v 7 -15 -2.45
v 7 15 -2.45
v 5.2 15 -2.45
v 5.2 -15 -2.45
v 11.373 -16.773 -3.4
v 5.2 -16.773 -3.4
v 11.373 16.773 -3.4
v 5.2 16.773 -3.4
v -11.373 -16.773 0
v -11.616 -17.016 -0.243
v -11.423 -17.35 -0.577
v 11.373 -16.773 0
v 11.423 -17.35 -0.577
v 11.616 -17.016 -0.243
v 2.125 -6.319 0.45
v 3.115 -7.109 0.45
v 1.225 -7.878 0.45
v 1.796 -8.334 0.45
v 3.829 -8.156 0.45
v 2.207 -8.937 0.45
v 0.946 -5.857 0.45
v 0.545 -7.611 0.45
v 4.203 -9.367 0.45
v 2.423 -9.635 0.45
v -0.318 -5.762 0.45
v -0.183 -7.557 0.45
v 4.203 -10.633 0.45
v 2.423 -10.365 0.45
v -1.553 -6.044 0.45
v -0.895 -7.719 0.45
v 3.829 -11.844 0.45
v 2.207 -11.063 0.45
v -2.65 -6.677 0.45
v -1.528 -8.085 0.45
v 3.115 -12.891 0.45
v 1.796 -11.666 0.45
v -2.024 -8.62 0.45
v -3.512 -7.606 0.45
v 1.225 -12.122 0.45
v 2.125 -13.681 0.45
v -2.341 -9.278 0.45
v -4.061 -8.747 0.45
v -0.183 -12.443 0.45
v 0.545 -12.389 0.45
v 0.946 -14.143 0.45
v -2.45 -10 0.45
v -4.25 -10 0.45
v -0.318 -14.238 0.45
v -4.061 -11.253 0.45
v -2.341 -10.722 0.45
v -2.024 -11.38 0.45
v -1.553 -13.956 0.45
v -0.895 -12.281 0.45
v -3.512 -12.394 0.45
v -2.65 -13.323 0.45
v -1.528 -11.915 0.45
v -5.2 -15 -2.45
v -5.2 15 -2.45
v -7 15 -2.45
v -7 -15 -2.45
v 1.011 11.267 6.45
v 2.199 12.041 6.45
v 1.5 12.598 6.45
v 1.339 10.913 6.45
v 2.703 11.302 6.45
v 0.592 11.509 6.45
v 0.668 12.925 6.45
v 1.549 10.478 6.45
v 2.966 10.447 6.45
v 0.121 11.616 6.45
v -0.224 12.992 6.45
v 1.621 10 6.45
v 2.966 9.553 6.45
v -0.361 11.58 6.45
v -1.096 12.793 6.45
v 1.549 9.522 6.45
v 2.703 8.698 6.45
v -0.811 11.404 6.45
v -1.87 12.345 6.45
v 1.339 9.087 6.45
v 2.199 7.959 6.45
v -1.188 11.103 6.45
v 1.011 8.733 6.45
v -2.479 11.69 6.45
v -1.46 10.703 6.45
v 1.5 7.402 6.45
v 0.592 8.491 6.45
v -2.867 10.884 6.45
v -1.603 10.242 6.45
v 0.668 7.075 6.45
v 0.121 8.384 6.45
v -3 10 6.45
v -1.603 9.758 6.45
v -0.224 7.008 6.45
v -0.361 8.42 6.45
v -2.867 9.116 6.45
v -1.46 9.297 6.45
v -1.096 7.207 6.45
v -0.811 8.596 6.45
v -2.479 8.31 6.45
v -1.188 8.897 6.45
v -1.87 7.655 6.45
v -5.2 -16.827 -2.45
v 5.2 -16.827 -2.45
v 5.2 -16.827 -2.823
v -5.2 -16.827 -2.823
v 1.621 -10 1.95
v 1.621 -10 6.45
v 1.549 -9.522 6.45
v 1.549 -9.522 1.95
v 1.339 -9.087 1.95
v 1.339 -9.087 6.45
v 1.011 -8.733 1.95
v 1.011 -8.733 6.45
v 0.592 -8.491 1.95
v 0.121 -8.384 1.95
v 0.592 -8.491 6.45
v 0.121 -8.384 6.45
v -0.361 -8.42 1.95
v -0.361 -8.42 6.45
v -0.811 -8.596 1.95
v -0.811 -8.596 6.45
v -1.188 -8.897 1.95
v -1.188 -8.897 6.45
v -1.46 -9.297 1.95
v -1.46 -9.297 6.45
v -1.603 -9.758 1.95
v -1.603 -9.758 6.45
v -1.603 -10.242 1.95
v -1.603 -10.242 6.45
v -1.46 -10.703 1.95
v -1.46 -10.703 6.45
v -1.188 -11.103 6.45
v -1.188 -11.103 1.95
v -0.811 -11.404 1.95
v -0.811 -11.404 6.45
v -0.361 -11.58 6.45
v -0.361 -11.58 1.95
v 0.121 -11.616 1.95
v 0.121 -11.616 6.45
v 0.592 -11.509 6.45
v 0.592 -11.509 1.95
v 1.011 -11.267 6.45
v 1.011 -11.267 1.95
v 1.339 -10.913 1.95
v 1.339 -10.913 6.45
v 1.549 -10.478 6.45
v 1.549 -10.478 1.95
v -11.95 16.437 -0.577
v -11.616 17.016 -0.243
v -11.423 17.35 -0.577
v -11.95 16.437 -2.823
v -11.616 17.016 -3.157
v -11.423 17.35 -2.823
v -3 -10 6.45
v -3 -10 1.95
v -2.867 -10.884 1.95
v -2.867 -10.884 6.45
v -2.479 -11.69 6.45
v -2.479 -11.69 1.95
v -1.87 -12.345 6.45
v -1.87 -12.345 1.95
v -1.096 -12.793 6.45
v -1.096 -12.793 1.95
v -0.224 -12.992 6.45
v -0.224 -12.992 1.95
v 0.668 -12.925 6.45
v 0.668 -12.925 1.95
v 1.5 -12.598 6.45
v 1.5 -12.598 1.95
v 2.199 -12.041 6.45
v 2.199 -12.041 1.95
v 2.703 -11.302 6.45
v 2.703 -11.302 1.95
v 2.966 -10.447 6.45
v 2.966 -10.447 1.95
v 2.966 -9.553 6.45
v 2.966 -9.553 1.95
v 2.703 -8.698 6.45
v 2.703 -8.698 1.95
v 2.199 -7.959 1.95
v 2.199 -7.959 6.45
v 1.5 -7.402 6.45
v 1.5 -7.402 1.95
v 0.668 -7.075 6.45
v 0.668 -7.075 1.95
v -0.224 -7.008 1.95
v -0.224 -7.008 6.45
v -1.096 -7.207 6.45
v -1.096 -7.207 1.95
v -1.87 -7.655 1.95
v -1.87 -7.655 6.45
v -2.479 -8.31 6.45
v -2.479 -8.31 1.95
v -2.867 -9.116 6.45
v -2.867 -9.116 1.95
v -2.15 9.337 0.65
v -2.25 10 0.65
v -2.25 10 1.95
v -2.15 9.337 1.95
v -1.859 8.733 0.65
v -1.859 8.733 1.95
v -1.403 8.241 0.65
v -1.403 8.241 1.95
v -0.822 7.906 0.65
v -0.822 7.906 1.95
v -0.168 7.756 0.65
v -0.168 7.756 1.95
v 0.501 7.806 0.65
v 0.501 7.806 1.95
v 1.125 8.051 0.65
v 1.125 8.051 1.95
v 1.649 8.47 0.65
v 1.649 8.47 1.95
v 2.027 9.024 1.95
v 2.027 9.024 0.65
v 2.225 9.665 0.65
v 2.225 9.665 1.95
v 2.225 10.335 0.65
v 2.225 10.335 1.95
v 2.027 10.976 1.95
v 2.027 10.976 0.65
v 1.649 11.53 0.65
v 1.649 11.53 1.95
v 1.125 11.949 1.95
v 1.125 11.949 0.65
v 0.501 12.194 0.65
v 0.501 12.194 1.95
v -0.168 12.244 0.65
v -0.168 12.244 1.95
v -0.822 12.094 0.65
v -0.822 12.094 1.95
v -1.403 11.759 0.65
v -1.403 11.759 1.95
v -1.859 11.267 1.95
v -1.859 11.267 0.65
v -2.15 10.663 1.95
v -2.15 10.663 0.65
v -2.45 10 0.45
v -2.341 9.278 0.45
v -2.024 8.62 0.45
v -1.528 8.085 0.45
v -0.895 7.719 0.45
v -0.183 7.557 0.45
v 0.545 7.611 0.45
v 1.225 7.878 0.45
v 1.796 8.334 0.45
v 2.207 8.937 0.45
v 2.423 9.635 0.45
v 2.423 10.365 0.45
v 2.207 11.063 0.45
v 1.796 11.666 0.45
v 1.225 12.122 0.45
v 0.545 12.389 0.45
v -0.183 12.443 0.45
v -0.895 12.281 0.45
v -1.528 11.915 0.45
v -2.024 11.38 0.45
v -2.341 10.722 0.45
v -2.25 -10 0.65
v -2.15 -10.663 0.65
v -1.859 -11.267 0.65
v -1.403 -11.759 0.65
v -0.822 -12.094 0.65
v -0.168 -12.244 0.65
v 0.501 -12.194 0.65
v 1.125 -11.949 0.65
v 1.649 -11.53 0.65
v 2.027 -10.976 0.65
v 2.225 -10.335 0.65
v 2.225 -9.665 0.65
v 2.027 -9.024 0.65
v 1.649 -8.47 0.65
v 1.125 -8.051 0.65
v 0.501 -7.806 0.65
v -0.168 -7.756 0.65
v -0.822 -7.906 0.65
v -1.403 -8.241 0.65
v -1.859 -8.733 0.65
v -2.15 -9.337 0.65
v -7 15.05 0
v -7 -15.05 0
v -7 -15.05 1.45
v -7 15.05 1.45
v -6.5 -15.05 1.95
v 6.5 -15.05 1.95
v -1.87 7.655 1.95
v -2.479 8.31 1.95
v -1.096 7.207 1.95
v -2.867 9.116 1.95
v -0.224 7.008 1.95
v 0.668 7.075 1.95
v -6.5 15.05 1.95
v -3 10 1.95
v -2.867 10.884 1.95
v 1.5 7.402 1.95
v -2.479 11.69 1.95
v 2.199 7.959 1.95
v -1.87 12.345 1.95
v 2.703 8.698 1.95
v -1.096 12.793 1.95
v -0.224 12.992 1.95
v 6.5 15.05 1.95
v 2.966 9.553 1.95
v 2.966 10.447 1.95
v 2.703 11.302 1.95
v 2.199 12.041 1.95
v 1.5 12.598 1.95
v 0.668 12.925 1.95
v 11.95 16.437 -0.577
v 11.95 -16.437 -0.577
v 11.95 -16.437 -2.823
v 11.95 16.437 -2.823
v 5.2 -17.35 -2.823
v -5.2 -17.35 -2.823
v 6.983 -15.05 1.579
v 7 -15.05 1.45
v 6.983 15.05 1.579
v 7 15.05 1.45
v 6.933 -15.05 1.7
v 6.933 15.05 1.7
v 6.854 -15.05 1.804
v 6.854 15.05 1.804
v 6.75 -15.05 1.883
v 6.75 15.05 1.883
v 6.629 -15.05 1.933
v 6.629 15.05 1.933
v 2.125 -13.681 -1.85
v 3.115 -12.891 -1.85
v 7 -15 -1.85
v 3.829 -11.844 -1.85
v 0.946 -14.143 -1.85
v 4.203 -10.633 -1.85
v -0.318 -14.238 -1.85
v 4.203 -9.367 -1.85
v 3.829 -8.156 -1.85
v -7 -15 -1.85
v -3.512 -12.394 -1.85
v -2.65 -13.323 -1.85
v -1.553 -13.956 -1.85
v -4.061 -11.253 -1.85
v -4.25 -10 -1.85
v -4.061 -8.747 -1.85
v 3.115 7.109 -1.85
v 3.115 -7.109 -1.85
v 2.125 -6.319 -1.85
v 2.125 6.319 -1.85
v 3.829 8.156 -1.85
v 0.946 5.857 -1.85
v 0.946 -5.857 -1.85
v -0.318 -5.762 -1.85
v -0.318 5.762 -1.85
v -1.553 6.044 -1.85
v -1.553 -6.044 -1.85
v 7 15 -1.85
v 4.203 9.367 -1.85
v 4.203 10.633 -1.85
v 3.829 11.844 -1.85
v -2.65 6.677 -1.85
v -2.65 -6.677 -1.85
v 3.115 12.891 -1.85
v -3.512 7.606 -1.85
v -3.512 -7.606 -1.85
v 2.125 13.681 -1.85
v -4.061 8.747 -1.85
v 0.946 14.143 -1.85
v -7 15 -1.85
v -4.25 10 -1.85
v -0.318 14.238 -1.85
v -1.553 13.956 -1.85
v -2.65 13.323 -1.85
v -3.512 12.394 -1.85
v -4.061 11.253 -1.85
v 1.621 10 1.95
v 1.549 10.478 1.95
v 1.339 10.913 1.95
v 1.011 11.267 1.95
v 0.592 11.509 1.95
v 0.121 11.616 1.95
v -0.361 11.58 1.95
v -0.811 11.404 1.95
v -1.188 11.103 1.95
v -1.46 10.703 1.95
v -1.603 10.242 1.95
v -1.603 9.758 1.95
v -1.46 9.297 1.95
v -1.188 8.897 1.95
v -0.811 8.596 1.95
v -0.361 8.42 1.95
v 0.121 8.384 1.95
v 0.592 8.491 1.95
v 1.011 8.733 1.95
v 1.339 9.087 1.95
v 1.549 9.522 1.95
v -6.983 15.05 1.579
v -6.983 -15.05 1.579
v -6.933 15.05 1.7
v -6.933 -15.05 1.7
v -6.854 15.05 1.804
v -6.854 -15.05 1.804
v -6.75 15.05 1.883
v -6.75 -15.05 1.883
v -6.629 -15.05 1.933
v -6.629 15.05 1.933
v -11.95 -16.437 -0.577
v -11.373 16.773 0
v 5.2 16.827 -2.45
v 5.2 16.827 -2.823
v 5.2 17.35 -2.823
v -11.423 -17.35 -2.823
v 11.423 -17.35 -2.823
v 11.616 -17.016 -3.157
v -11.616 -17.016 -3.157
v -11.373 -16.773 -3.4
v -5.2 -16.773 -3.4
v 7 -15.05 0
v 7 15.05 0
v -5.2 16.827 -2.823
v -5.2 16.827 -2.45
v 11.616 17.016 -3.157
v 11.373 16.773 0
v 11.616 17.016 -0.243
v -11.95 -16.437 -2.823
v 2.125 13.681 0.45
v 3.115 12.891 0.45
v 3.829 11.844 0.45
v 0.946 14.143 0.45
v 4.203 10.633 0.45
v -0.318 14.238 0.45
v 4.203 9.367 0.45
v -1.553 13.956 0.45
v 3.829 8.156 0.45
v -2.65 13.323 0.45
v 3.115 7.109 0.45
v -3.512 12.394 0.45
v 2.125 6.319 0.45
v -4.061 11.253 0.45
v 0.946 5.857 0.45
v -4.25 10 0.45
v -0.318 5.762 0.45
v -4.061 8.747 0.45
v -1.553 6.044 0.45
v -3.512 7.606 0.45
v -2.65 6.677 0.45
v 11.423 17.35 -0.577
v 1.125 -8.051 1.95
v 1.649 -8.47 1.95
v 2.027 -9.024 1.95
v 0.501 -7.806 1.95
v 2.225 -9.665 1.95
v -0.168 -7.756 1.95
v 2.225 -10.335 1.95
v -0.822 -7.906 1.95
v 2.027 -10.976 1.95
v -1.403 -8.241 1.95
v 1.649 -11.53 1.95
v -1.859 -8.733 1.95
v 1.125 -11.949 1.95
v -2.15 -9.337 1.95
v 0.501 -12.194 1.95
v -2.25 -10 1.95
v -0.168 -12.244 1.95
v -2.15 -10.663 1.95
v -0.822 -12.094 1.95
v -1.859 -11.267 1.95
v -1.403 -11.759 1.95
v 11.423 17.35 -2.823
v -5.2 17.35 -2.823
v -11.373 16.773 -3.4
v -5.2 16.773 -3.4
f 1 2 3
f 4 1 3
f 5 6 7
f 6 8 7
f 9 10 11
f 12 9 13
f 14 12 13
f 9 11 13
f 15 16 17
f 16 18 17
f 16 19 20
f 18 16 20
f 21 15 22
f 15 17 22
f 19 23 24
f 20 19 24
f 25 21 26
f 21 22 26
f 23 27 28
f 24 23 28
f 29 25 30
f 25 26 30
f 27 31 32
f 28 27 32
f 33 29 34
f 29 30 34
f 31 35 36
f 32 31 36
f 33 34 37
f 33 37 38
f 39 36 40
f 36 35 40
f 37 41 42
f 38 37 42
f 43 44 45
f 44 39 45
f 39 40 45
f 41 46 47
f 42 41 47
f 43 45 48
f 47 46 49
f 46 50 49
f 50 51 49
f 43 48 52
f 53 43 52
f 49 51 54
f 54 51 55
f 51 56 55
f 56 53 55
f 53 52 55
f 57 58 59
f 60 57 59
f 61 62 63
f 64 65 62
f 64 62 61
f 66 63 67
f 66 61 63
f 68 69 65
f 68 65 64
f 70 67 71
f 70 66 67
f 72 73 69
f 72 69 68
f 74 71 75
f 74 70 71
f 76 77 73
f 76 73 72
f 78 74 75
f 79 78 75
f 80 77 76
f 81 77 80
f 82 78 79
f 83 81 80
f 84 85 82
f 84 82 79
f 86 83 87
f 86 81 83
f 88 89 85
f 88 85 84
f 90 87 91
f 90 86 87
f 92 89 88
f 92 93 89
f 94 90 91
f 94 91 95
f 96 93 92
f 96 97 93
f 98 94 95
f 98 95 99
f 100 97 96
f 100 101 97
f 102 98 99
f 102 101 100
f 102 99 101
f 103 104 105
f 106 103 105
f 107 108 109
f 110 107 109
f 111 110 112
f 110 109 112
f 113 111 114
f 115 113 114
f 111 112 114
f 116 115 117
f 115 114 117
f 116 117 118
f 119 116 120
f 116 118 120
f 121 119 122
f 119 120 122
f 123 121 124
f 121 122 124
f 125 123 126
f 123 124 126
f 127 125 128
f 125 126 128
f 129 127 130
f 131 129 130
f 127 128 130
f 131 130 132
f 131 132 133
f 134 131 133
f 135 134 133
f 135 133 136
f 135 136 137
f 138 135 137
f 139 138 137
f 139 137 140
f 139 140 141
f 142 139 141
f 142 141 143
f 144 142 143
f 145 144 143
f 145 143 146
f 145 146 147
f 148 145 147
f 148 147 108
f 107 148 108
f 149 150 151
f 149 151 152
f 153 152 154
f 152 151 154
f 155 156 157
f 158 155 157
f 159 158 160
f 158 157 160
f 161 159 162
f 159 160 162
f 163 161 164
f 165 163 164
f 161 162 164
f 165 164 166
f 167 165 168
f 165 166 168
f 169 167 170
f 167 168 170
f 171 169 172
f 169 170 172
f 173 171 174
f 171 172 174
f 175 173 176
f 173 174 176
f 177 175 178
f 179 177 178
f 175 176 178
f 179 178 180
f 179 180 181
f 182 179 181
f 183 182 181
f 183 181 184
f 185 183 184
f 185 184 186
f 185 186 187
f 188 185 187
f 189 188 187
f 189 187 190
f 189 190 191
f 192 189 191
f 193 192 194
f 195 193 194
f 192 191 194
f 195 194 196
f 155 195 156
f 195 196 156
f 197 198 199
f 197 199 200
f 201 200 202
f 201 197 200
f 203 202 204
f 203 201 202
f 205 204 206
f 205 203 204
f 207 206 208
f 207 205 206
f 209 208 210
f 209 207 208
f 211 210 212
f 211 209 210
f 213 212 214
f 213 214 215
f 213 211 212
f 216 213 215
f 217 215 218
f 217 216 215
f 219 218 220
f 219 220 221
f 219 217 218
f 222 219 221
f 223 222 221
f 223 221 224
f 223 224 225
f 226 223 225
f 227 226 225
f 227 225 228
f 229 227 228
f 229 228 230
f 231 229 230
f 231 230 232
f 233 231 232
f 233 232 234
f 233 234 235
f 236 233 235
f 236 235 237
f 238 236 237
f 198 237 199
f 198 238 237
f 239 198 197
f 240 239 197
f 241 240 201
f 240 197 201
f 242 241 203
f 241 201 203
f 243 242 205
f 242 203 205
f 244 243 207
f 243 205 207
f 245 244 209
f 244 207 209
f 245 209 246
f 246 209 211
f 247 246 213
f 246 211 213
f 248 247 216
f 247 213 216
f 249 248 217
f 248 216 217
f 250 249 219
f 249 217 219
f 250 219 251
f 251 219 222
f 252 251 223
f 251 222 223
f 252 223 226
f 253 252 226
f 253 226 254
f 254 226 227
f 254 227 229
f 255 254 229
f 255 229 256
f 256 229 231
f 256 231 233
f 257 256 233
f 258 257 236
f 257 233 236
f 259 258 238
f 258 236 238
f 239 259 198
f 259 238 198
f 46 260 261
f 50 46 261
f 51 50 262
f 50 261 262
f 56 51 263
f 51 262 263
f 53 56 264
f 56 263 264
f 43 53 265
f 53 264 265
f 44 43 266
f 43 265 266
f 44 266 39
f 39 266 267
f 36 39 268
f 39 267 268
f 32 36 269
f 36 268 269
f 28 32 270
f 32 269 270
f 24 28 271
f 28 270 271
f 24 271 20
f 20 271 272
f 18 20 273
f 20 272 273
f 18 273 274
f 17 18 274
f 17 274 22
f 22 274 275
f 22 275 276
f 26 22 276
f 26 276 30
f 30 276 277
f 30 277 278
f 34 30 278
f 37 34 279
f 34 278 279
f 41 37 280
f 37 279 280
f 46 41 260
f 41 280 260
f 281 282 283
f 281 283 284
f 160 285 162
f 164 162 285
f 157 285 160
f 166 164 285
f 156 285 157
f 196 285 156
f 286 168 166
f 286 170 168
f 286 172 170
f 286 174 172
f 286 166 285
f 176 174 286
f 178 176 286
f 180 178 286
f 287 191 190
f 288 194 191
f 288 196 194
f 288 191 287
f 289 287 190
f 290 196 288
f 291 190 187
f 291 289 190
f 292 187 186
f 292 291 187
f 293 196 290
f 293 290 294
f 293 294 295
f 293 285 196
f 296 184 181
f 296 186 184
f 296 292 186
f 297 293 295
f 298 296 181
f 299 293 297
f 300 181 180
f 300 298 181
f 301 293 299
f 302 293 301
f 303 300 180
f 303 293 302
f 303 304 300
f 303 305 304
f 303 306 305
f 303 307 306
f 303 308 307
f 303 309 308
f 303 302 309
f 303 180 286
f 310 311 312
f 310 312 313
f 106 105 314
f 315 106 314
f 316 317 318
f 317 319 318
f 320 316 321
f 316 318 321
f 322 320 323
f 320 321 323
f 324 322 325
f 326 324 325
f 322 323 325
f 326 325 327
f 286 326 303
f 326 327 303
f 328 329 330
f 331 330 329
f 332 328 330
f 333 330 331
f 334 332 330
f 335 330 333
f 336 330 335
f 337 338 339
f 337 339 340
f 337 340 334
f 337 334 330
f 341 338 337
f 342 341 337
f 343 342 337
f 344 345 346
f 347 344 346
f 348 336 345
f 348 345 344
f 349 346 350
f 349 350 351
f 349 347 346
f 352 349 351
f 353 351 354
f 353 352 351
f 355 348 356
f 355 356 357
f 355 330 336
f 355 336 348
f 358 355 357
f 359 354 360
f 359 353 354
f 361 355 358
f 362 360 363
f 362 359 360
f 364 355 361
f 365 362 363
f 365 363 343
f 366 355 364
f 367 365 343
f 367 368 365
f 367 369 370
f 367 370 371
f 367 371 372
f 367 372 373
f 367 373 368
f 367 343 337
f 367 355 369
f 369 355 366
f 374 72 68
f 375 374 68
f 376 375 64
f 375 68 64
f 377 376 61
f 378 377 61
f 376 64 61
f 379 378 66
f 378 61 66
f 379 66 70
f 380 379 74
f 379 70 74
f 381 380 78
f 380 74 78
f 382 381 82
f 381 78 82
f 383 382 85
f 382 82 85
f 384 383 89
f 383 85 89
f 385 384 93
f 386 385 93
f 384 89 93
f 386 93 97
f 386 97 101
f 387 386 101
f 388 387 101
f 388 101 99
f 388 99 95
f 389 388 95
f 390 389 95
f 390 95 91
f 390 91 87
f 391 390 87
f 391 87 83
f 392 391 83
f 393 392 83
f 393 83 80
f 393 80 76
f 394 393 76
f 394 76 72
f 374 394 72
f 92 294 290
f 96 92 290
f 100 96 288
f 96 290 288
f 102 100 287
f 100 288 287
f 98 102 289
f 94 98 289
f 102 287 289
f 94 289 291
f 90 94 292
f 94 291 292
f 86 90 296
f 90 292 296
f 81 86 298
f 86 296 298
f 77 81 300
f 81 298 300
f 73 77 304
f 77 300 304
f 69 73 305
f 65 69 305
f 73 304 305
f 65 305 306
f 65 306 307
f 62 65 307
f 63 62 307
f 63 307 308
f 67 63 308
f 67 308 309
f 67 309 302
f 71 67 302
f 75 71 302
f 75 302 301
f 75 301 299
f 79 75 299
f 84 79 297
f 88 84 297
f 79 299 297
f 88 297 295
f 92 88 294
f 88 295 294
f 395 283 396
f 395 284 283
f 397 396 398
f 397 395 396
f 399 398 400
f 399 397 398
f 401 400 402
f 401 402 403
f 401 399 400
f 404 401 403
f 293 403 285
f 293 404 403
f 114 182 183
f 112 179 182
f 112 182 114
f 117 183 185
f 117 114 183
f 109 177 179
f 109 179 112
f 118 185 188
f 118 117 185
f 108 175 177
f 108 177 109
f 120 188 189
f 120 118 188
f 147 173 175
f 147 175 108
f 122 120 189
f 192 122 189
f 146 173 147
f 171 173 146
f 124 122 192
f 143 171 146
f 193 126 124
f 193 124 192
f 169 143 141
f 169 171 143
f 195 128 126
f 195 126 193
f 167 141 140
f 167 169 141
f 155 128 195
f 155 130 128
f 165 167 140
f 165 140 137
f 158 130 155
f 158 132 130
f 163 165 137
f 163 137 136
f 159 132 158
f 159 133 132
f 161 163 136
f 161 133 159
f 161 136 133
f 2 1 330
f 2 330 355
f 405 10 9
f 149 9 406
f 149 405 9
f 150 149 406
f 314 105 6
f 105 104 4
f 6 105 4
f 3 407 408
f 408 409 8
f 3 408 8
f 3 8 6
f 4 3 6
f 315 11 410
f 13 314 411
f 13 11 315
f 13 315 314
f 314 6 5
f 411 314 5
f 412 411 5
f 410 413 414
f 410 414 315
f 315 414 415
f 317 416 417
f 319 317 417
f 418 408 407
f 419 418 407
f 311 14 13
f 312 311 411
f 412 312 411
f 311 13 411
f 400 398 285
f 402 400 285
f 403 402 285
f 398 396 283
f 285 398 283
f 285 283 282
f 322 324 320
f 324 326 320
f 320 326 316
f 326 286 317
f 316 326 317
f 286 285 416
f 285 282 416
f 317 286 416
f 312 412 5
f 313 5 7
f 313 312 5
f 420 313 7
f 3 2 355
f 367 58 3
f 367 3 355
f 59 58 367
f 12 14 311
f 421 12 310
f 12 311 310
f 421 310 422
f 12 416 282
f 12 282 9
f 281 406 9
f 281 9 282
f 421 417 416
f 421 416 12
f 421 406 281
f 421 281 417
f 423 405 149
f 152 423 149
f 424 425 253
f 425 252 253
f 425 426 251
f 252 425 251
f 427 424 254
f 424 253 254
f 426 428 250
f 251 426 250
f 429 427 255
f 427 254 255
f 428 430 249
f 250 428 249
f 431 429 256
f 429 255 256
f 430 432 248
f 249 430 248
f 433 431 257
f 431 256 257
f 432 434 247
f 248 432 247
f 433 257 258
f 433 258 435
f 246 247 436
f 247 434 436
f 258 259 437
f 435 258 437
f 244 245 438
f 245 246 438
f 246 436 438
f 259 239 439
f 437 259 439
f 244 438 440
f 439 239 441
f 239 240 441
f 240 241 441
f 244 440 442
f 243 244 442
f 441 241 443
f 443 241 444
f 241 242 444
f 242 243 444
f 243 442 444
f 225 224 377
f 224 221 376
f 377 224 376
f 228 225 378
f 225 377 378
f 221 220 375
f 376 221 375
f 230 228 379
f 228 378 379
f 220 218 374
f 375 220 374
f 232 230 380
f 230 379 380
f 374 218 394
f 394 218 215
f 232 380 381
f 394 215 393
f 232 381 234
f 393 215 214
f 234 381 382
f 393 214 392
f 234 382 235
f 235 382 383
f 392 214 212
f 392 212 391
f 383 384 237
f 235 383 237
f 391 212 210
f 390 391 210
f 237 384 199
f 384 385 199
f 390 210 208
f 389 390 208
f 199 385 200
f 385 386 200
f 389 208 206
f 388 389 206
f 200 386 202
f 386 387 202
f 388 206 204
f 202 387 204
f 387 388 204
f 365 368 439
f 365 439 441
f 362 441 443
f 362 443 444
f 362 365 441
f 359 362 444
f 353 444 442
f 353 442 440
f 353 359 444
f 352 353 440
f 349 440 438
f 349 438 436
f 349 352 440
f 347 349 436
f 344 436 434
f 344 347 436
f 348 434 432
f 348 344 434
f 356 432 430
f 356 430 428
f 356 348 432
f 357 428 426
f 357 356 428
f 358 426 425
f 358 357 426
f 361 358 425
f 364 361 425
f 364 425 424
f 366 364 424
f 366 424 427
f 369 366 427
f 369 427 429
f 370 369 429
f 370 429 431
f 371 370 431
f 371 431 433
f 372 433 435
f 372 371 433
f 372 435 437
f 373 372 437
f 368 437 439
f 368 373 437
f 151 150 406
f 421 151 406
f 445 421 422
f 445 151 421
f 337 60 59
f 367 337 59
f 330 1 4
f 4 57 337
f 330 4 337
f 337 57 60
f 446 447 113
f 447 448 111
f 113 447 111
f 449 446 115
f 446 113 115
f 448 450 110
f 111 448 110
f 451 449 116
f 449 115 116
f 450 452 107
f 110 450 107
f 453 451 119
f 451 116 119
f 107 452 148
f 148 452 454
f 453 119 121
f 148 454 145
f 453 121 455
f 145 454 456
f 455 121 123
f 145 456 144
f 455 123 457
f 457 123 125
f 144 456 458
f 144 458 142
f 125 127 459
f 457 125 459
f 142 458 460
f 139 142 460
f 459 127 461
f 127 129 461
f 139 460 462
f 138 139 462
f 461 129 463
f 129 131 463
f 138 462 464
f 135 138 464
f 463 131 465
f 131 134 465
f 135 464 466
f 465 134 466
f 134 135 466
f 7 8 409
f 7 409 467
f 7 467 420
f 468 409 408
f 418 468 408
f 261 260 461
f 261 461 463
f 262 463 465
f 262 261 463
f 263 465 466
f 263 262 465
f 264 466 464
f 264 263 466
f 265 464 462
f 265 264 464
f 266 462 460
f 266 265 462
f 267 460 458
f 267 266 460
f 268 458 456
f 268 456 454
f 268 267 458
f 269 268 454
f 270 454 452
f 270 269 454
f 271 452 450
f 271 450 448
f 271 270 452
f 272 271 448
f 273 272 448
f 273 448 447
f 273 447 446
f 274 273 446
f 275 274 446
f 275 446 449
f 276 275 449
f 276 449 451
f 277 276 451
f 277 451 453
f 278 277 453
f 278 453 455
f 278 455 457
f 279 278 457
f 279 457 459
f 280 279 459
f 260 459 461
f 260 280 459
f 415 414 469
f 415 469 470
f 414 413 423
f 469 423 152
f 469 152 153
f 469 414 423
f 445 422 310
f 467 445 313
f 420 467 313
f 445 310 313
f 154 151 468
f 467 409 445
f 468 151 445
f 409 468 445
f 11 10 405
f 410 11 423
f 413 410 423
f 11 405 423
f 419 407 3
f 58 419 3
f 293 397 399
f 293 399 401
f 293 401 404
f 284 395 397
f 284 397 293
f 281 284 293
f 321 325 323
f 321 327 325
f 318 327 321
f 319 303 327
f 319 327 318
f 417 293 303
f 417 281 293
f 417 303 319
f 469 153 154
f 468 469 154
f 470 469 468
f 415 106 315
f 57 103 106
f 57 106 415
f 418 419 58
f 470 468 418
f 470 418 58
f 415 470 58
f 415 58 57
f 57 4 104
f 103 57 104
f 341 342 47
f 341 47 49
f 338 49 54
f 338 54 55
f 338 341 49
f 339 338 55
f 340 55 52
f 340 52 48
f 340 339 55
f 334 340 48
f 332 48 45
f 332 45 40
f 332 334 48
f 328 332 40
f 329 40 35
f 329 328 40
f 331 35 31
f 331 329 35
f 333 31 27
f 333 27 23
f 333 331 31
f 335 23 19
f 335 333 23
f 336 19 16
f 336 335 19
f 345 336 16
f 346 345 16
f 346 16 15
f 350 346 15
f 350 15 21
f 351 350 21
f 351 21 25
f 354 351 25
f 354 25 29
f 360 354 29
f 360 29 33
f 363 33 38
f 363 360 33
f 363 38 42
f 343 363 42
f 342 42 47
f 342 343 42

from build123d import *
from OCP.BRepFilletAPI import BRepFilletAPI_MakeChamfer

# Parameters (mm, degrees)
SKETCH1_W           = 23.9
SKETCH1_H           = 34.7
BOSS_EXTRUDE1_DEPTH = 3.4
SKETCH2_W           = 14
SKETCH2_H           = 30.1
BOSS_EXTRUDE2_DEPTH = 1.95
SKETCH3_R           = 3
BOSS_EXTRUDE3_DEPTH = 4.5
CHAMFER1_SIZE       = 0.577
CUT_EXTRUDE1_DEPTH  = 5.2
SKETCH6_W           = 14
SKETCH6_H           = 30
CUT_EXTRUDE2_DEPTH  = 0.6
SKETCH7_R           = 4.25
CUT_EXTRUDE3_DEPTH  = 2.3
SKETCH8_R           = 2.25
CUT_EXTRUDE4_DEPTH  = 1.5
FILLET1_R           = 0.5
CHAMFER2_SIZE       = 0.577
CHAMFER3_SIZE       = 0.527
CHAMFER3_SIZE2      = 0.913344887
CHAMFER4_SIZE       = 0.913344887
CHAMFER4_SIZE2      = 0.527
CUT_EXTRUDE5_REACH  = 25.256
SKETCH9_R           = 1.621
CHAMFER5_SIZE       = 0.2


with BuildPart() as part:
    # Sketch1 → Boss-Extrude1 (new body)
    with BuildSketch(Plane.XY):
        Rectangle(SKETCH1_W, SKETCH1_H)
    extrude(amount=-BOSS_EXTRUDE1_DEPTH)

    # Sketch2 → Boss-Extrude2 (add)
    with BuildSketch(Plane.XY):
        Rectangle(SKETCH2_W, SKETCH2_H)
    extrude(amount=BOSS_EXTRUDE2_DEPTH)

    # Sketch3 → Boss-Extrude3 (add)
    with BuildSketch(Plane.XY.offset(1.95)):
        with Locations(Location((0, 10, 0), (0, 0, 180))):
            Circle(SKETCH3_R)
        with Locations(Location((0, -10, 0), (0, 0, 180))):
            Circle(SKETCH3_R)
    extrude(amount=BOSS_EXTRUDE3_DEPTH)

    # Chamfer1
    chamfer1_edges = [part.edges().sort_by_distance(p)[0] for p in [
        (11.95, 0, -3.4),
        (0, 17.35, -3.4),
        (-11.95, 0, -3.4),
        (0, -17.35, -3.4),
    ]]
    chamfer(chamfer1_edges, length=CHAMFER1_SIZE)

    # Sketch5 → Cut-Extrude1 (cut, symmetric)
    with BuildSketch(Plane(origin=(0, 0, 0), x_dir=(0, 0, -1), z_dir=(1, 0, 0))):
        Polygon((3.4, 16.773), (2.823, 17.35), (2.823, 16.826999997), (2.449999998, 16.826999997), (2.449999998, -16.826999997), (2.823, -16.826999997), (2.823, -17.35), (3.4, -16.773), align=None)
    extrude(amount=CUT_EXTRUDE1_DEPTH, both=True, mode=Mode.SUBTRACT)

    # Sketch6 → Cut-Extrude2 (cut)
    with BuildSketch(Plane(origin=(0, 0, -2.449999998), x_dir=(-1, 0, 0), z_dir=(0, 0, -1))):
        Rectangle(SKETCH6_W, SKETCH6_H)
    extrude(amount=-CUT_EXTRUDE2_DEPTH, mode=Mode.SUBTRACT)

    # Sketch7 → Cut-Extrude3 (cut)
    with BuildSketch(Plane.XY.offset(-1.849999998)):
        with Locations(Location((0, 10, 0), (0, 0, 180))):
            Circle(SKETCH7_R)
        with Locations(Location((0, -10, 0), (0, 0, 180))):
            Circle(SKETCH7_R)
    extrude(amount=CUT_EXTRUDE3_DEPTH, mode=Mode.SUBTRACT)

    # Sketch8 → Cut-Extrude4 (cut)
    with BuildSketch(Plane.XY.offset(0.450000002)):
        with Locations(Location((0, 10, 0), (0, 0, 180))):
            Circle(SKETCH8_R)
        with Locations(Location((0, -10, 0), (0, 0, 180))):
            Circle(SKETCH8_R)
    extrude(amount=CUT_EXTRUDE4_DEPTH, mode=Mode.SUBTRACT)

    # Fillet1
    fillet1_edges = [part.edges().sort_by_distance(p)[0] for p in [
        (-7, 0, 1.95),
        (7, 0, 1.95),
    ]]
    fillet(fillet1_edges, radius=FILLET1_R)

    # Chamfer2
    chamfer2_edges = [part.edges().sort_by_distance(p)[0] for p in [
        (0, 17.35, 0),
        (11.95, 0, 0),
        (0, -17.35, 0),
        (-11.95, 0, 0),
    ]]
    chamfer(chamfer2_edges, length=CHAMFER2_SIZE)

    # Chamfer3: one chamfer whose edges measure the first distance from different faces: ONE call of the kernel's chamfer builder (chamfer() names one face for all edges)
    chamfer3_edges_1 = [part.edges().sort_by_distance(p)[0] for p in [
        (11.95, 17.35, -1.7),
    ]]
    chamfer3_side_1 = [part.faces().sort_by_distance(p)[0] for p in [
        (0, 17.35, -1.7),
    ]]
    chamfer3_edges_2 = [part.edges().sort_by_distance(p)[0] for p in [
        (-11.95, -17.35, -1.7),
    ]]
    chamfer3_side_2 = [part.faces().sort_by_distance(p)[0] for p in [
        (0, -17.35, -1.7),
    ]]
    chamfer3 = BRepFilletAPI_MakeChamfer(part.part.solid().wrapped)
    for e in chamfer3_edges_1:
        chamfer3.Add(CHAMFER3_SIZE, CHAMFER3_SIZE2, e.wrapped, chamfer3_side_1[0].wrapped)  # the first distance lies on this face
    for e in chamfer3_edges_2:
        chamfer3.Add(CHAMFER3_SIZE, CHAMFER3_SIZE2, e.wrapped, chamfer3_side_2[0].wrapped)  # the first distance lies on this face
    add(Compound.cast(chamfer3.Shape()), mode=Mode.REPLACE)

    # Chamfer4: one chamfer whose edges measure the first distance from different faces: ONE call of the kernel's chamfer builder (chamfer() names one face for all edges)
    chamfer4_edges_1 = [part.edges().sort_by_distance(p)[0] for p in [
        (-11.95, 17.35, -1.7),
    ]]
    chamfer4_side_1 = [part.faces().sort_by_distance(p)[0] for p in [
        (-11.95, 0.456672443, -1.7),
    ]]
    chamfer4_edges_2 = [part.edges().sort_by_distance(p)[0] for p in [
        (11.95, -17.35, -1.7),
    ]]
    chamfer4_side_2 = [part.faces().sort_by_distance(p)[0] for p in [
        (11.95, -0.456672443, -1.7),
    ]]
    chamfer4 = BRepFilletAPI_MakeChamfer(part.part.solid().wrapped)
    for e in chamfer4_edges_1:
        chamfer4.Add(CHAMFER4_SIZE, CHAMFER4_SIZE2, e.wrapped, chamfer4_side_1[0].wrapped)  # the first distance lies on this face
    for e in chamfer4_edges_2:
        chamfer4.Add(CHAMFER4_SIZE, CHAMFER4_SIZE2, e.wrapped, chamfer4_side_2[0].wrapped)  # the first distance lies on this face
    add(Compound.cast(chamfer4.Shape()), mode=Mode.REPLACE)

    # Sketch9 → Cut-Extrude5 (cut, up to next)
    with BuildSketch(Plane.XY.offset(6.45), mode=Mode.PRIVATE) as cut_extrude5_sk1:
        with Locations((0, 10)):
            Circle(SKETCH9_R)
    cut_extrude5_tool1 = extrude(cut_extrude5_sk1.sketch, amount=-CUT_EXTRUDE5_REACH, mode=Mode.PRIVATE) & part.part
    # Sketch9 → Cut-Extrude5 (cut, up to next)
    with BuildSketch(Plane.XY.offset(6.45), mode=Mode.PRIVATE) as cut_extrude5_sk2:
        with Locations((0, -10)):
            Circle(SKETCH9_R)
    cut_extrude5_tool2 = extrude(cut_extrude5_sk2.sketch, amount=-CUT_EXTRUDE5_REACH, mode=Mode.PRIVATE) & part.part
    add(cut_extrude5_tool1.solids().sort_by_distance((0, 10, 6.45))[0], mode=Mode.SUBTRACT)
    add(cut_extrude5_tool2.solids().sort_by_distance((0, -10, 6.45))[0], mode=Mode.SUBTRACT)

    # Chamfer5
    chamfer5_edges = [part.edges().sort_by_distance(p)[0] for p in [
        (2.25, -10, 0.450000002),
        (2.25, 10, 0.450000002),
    ]]
    chamfer(chamfer5_edges, length=CHAMFER5_SIZE)


solid = part.part
